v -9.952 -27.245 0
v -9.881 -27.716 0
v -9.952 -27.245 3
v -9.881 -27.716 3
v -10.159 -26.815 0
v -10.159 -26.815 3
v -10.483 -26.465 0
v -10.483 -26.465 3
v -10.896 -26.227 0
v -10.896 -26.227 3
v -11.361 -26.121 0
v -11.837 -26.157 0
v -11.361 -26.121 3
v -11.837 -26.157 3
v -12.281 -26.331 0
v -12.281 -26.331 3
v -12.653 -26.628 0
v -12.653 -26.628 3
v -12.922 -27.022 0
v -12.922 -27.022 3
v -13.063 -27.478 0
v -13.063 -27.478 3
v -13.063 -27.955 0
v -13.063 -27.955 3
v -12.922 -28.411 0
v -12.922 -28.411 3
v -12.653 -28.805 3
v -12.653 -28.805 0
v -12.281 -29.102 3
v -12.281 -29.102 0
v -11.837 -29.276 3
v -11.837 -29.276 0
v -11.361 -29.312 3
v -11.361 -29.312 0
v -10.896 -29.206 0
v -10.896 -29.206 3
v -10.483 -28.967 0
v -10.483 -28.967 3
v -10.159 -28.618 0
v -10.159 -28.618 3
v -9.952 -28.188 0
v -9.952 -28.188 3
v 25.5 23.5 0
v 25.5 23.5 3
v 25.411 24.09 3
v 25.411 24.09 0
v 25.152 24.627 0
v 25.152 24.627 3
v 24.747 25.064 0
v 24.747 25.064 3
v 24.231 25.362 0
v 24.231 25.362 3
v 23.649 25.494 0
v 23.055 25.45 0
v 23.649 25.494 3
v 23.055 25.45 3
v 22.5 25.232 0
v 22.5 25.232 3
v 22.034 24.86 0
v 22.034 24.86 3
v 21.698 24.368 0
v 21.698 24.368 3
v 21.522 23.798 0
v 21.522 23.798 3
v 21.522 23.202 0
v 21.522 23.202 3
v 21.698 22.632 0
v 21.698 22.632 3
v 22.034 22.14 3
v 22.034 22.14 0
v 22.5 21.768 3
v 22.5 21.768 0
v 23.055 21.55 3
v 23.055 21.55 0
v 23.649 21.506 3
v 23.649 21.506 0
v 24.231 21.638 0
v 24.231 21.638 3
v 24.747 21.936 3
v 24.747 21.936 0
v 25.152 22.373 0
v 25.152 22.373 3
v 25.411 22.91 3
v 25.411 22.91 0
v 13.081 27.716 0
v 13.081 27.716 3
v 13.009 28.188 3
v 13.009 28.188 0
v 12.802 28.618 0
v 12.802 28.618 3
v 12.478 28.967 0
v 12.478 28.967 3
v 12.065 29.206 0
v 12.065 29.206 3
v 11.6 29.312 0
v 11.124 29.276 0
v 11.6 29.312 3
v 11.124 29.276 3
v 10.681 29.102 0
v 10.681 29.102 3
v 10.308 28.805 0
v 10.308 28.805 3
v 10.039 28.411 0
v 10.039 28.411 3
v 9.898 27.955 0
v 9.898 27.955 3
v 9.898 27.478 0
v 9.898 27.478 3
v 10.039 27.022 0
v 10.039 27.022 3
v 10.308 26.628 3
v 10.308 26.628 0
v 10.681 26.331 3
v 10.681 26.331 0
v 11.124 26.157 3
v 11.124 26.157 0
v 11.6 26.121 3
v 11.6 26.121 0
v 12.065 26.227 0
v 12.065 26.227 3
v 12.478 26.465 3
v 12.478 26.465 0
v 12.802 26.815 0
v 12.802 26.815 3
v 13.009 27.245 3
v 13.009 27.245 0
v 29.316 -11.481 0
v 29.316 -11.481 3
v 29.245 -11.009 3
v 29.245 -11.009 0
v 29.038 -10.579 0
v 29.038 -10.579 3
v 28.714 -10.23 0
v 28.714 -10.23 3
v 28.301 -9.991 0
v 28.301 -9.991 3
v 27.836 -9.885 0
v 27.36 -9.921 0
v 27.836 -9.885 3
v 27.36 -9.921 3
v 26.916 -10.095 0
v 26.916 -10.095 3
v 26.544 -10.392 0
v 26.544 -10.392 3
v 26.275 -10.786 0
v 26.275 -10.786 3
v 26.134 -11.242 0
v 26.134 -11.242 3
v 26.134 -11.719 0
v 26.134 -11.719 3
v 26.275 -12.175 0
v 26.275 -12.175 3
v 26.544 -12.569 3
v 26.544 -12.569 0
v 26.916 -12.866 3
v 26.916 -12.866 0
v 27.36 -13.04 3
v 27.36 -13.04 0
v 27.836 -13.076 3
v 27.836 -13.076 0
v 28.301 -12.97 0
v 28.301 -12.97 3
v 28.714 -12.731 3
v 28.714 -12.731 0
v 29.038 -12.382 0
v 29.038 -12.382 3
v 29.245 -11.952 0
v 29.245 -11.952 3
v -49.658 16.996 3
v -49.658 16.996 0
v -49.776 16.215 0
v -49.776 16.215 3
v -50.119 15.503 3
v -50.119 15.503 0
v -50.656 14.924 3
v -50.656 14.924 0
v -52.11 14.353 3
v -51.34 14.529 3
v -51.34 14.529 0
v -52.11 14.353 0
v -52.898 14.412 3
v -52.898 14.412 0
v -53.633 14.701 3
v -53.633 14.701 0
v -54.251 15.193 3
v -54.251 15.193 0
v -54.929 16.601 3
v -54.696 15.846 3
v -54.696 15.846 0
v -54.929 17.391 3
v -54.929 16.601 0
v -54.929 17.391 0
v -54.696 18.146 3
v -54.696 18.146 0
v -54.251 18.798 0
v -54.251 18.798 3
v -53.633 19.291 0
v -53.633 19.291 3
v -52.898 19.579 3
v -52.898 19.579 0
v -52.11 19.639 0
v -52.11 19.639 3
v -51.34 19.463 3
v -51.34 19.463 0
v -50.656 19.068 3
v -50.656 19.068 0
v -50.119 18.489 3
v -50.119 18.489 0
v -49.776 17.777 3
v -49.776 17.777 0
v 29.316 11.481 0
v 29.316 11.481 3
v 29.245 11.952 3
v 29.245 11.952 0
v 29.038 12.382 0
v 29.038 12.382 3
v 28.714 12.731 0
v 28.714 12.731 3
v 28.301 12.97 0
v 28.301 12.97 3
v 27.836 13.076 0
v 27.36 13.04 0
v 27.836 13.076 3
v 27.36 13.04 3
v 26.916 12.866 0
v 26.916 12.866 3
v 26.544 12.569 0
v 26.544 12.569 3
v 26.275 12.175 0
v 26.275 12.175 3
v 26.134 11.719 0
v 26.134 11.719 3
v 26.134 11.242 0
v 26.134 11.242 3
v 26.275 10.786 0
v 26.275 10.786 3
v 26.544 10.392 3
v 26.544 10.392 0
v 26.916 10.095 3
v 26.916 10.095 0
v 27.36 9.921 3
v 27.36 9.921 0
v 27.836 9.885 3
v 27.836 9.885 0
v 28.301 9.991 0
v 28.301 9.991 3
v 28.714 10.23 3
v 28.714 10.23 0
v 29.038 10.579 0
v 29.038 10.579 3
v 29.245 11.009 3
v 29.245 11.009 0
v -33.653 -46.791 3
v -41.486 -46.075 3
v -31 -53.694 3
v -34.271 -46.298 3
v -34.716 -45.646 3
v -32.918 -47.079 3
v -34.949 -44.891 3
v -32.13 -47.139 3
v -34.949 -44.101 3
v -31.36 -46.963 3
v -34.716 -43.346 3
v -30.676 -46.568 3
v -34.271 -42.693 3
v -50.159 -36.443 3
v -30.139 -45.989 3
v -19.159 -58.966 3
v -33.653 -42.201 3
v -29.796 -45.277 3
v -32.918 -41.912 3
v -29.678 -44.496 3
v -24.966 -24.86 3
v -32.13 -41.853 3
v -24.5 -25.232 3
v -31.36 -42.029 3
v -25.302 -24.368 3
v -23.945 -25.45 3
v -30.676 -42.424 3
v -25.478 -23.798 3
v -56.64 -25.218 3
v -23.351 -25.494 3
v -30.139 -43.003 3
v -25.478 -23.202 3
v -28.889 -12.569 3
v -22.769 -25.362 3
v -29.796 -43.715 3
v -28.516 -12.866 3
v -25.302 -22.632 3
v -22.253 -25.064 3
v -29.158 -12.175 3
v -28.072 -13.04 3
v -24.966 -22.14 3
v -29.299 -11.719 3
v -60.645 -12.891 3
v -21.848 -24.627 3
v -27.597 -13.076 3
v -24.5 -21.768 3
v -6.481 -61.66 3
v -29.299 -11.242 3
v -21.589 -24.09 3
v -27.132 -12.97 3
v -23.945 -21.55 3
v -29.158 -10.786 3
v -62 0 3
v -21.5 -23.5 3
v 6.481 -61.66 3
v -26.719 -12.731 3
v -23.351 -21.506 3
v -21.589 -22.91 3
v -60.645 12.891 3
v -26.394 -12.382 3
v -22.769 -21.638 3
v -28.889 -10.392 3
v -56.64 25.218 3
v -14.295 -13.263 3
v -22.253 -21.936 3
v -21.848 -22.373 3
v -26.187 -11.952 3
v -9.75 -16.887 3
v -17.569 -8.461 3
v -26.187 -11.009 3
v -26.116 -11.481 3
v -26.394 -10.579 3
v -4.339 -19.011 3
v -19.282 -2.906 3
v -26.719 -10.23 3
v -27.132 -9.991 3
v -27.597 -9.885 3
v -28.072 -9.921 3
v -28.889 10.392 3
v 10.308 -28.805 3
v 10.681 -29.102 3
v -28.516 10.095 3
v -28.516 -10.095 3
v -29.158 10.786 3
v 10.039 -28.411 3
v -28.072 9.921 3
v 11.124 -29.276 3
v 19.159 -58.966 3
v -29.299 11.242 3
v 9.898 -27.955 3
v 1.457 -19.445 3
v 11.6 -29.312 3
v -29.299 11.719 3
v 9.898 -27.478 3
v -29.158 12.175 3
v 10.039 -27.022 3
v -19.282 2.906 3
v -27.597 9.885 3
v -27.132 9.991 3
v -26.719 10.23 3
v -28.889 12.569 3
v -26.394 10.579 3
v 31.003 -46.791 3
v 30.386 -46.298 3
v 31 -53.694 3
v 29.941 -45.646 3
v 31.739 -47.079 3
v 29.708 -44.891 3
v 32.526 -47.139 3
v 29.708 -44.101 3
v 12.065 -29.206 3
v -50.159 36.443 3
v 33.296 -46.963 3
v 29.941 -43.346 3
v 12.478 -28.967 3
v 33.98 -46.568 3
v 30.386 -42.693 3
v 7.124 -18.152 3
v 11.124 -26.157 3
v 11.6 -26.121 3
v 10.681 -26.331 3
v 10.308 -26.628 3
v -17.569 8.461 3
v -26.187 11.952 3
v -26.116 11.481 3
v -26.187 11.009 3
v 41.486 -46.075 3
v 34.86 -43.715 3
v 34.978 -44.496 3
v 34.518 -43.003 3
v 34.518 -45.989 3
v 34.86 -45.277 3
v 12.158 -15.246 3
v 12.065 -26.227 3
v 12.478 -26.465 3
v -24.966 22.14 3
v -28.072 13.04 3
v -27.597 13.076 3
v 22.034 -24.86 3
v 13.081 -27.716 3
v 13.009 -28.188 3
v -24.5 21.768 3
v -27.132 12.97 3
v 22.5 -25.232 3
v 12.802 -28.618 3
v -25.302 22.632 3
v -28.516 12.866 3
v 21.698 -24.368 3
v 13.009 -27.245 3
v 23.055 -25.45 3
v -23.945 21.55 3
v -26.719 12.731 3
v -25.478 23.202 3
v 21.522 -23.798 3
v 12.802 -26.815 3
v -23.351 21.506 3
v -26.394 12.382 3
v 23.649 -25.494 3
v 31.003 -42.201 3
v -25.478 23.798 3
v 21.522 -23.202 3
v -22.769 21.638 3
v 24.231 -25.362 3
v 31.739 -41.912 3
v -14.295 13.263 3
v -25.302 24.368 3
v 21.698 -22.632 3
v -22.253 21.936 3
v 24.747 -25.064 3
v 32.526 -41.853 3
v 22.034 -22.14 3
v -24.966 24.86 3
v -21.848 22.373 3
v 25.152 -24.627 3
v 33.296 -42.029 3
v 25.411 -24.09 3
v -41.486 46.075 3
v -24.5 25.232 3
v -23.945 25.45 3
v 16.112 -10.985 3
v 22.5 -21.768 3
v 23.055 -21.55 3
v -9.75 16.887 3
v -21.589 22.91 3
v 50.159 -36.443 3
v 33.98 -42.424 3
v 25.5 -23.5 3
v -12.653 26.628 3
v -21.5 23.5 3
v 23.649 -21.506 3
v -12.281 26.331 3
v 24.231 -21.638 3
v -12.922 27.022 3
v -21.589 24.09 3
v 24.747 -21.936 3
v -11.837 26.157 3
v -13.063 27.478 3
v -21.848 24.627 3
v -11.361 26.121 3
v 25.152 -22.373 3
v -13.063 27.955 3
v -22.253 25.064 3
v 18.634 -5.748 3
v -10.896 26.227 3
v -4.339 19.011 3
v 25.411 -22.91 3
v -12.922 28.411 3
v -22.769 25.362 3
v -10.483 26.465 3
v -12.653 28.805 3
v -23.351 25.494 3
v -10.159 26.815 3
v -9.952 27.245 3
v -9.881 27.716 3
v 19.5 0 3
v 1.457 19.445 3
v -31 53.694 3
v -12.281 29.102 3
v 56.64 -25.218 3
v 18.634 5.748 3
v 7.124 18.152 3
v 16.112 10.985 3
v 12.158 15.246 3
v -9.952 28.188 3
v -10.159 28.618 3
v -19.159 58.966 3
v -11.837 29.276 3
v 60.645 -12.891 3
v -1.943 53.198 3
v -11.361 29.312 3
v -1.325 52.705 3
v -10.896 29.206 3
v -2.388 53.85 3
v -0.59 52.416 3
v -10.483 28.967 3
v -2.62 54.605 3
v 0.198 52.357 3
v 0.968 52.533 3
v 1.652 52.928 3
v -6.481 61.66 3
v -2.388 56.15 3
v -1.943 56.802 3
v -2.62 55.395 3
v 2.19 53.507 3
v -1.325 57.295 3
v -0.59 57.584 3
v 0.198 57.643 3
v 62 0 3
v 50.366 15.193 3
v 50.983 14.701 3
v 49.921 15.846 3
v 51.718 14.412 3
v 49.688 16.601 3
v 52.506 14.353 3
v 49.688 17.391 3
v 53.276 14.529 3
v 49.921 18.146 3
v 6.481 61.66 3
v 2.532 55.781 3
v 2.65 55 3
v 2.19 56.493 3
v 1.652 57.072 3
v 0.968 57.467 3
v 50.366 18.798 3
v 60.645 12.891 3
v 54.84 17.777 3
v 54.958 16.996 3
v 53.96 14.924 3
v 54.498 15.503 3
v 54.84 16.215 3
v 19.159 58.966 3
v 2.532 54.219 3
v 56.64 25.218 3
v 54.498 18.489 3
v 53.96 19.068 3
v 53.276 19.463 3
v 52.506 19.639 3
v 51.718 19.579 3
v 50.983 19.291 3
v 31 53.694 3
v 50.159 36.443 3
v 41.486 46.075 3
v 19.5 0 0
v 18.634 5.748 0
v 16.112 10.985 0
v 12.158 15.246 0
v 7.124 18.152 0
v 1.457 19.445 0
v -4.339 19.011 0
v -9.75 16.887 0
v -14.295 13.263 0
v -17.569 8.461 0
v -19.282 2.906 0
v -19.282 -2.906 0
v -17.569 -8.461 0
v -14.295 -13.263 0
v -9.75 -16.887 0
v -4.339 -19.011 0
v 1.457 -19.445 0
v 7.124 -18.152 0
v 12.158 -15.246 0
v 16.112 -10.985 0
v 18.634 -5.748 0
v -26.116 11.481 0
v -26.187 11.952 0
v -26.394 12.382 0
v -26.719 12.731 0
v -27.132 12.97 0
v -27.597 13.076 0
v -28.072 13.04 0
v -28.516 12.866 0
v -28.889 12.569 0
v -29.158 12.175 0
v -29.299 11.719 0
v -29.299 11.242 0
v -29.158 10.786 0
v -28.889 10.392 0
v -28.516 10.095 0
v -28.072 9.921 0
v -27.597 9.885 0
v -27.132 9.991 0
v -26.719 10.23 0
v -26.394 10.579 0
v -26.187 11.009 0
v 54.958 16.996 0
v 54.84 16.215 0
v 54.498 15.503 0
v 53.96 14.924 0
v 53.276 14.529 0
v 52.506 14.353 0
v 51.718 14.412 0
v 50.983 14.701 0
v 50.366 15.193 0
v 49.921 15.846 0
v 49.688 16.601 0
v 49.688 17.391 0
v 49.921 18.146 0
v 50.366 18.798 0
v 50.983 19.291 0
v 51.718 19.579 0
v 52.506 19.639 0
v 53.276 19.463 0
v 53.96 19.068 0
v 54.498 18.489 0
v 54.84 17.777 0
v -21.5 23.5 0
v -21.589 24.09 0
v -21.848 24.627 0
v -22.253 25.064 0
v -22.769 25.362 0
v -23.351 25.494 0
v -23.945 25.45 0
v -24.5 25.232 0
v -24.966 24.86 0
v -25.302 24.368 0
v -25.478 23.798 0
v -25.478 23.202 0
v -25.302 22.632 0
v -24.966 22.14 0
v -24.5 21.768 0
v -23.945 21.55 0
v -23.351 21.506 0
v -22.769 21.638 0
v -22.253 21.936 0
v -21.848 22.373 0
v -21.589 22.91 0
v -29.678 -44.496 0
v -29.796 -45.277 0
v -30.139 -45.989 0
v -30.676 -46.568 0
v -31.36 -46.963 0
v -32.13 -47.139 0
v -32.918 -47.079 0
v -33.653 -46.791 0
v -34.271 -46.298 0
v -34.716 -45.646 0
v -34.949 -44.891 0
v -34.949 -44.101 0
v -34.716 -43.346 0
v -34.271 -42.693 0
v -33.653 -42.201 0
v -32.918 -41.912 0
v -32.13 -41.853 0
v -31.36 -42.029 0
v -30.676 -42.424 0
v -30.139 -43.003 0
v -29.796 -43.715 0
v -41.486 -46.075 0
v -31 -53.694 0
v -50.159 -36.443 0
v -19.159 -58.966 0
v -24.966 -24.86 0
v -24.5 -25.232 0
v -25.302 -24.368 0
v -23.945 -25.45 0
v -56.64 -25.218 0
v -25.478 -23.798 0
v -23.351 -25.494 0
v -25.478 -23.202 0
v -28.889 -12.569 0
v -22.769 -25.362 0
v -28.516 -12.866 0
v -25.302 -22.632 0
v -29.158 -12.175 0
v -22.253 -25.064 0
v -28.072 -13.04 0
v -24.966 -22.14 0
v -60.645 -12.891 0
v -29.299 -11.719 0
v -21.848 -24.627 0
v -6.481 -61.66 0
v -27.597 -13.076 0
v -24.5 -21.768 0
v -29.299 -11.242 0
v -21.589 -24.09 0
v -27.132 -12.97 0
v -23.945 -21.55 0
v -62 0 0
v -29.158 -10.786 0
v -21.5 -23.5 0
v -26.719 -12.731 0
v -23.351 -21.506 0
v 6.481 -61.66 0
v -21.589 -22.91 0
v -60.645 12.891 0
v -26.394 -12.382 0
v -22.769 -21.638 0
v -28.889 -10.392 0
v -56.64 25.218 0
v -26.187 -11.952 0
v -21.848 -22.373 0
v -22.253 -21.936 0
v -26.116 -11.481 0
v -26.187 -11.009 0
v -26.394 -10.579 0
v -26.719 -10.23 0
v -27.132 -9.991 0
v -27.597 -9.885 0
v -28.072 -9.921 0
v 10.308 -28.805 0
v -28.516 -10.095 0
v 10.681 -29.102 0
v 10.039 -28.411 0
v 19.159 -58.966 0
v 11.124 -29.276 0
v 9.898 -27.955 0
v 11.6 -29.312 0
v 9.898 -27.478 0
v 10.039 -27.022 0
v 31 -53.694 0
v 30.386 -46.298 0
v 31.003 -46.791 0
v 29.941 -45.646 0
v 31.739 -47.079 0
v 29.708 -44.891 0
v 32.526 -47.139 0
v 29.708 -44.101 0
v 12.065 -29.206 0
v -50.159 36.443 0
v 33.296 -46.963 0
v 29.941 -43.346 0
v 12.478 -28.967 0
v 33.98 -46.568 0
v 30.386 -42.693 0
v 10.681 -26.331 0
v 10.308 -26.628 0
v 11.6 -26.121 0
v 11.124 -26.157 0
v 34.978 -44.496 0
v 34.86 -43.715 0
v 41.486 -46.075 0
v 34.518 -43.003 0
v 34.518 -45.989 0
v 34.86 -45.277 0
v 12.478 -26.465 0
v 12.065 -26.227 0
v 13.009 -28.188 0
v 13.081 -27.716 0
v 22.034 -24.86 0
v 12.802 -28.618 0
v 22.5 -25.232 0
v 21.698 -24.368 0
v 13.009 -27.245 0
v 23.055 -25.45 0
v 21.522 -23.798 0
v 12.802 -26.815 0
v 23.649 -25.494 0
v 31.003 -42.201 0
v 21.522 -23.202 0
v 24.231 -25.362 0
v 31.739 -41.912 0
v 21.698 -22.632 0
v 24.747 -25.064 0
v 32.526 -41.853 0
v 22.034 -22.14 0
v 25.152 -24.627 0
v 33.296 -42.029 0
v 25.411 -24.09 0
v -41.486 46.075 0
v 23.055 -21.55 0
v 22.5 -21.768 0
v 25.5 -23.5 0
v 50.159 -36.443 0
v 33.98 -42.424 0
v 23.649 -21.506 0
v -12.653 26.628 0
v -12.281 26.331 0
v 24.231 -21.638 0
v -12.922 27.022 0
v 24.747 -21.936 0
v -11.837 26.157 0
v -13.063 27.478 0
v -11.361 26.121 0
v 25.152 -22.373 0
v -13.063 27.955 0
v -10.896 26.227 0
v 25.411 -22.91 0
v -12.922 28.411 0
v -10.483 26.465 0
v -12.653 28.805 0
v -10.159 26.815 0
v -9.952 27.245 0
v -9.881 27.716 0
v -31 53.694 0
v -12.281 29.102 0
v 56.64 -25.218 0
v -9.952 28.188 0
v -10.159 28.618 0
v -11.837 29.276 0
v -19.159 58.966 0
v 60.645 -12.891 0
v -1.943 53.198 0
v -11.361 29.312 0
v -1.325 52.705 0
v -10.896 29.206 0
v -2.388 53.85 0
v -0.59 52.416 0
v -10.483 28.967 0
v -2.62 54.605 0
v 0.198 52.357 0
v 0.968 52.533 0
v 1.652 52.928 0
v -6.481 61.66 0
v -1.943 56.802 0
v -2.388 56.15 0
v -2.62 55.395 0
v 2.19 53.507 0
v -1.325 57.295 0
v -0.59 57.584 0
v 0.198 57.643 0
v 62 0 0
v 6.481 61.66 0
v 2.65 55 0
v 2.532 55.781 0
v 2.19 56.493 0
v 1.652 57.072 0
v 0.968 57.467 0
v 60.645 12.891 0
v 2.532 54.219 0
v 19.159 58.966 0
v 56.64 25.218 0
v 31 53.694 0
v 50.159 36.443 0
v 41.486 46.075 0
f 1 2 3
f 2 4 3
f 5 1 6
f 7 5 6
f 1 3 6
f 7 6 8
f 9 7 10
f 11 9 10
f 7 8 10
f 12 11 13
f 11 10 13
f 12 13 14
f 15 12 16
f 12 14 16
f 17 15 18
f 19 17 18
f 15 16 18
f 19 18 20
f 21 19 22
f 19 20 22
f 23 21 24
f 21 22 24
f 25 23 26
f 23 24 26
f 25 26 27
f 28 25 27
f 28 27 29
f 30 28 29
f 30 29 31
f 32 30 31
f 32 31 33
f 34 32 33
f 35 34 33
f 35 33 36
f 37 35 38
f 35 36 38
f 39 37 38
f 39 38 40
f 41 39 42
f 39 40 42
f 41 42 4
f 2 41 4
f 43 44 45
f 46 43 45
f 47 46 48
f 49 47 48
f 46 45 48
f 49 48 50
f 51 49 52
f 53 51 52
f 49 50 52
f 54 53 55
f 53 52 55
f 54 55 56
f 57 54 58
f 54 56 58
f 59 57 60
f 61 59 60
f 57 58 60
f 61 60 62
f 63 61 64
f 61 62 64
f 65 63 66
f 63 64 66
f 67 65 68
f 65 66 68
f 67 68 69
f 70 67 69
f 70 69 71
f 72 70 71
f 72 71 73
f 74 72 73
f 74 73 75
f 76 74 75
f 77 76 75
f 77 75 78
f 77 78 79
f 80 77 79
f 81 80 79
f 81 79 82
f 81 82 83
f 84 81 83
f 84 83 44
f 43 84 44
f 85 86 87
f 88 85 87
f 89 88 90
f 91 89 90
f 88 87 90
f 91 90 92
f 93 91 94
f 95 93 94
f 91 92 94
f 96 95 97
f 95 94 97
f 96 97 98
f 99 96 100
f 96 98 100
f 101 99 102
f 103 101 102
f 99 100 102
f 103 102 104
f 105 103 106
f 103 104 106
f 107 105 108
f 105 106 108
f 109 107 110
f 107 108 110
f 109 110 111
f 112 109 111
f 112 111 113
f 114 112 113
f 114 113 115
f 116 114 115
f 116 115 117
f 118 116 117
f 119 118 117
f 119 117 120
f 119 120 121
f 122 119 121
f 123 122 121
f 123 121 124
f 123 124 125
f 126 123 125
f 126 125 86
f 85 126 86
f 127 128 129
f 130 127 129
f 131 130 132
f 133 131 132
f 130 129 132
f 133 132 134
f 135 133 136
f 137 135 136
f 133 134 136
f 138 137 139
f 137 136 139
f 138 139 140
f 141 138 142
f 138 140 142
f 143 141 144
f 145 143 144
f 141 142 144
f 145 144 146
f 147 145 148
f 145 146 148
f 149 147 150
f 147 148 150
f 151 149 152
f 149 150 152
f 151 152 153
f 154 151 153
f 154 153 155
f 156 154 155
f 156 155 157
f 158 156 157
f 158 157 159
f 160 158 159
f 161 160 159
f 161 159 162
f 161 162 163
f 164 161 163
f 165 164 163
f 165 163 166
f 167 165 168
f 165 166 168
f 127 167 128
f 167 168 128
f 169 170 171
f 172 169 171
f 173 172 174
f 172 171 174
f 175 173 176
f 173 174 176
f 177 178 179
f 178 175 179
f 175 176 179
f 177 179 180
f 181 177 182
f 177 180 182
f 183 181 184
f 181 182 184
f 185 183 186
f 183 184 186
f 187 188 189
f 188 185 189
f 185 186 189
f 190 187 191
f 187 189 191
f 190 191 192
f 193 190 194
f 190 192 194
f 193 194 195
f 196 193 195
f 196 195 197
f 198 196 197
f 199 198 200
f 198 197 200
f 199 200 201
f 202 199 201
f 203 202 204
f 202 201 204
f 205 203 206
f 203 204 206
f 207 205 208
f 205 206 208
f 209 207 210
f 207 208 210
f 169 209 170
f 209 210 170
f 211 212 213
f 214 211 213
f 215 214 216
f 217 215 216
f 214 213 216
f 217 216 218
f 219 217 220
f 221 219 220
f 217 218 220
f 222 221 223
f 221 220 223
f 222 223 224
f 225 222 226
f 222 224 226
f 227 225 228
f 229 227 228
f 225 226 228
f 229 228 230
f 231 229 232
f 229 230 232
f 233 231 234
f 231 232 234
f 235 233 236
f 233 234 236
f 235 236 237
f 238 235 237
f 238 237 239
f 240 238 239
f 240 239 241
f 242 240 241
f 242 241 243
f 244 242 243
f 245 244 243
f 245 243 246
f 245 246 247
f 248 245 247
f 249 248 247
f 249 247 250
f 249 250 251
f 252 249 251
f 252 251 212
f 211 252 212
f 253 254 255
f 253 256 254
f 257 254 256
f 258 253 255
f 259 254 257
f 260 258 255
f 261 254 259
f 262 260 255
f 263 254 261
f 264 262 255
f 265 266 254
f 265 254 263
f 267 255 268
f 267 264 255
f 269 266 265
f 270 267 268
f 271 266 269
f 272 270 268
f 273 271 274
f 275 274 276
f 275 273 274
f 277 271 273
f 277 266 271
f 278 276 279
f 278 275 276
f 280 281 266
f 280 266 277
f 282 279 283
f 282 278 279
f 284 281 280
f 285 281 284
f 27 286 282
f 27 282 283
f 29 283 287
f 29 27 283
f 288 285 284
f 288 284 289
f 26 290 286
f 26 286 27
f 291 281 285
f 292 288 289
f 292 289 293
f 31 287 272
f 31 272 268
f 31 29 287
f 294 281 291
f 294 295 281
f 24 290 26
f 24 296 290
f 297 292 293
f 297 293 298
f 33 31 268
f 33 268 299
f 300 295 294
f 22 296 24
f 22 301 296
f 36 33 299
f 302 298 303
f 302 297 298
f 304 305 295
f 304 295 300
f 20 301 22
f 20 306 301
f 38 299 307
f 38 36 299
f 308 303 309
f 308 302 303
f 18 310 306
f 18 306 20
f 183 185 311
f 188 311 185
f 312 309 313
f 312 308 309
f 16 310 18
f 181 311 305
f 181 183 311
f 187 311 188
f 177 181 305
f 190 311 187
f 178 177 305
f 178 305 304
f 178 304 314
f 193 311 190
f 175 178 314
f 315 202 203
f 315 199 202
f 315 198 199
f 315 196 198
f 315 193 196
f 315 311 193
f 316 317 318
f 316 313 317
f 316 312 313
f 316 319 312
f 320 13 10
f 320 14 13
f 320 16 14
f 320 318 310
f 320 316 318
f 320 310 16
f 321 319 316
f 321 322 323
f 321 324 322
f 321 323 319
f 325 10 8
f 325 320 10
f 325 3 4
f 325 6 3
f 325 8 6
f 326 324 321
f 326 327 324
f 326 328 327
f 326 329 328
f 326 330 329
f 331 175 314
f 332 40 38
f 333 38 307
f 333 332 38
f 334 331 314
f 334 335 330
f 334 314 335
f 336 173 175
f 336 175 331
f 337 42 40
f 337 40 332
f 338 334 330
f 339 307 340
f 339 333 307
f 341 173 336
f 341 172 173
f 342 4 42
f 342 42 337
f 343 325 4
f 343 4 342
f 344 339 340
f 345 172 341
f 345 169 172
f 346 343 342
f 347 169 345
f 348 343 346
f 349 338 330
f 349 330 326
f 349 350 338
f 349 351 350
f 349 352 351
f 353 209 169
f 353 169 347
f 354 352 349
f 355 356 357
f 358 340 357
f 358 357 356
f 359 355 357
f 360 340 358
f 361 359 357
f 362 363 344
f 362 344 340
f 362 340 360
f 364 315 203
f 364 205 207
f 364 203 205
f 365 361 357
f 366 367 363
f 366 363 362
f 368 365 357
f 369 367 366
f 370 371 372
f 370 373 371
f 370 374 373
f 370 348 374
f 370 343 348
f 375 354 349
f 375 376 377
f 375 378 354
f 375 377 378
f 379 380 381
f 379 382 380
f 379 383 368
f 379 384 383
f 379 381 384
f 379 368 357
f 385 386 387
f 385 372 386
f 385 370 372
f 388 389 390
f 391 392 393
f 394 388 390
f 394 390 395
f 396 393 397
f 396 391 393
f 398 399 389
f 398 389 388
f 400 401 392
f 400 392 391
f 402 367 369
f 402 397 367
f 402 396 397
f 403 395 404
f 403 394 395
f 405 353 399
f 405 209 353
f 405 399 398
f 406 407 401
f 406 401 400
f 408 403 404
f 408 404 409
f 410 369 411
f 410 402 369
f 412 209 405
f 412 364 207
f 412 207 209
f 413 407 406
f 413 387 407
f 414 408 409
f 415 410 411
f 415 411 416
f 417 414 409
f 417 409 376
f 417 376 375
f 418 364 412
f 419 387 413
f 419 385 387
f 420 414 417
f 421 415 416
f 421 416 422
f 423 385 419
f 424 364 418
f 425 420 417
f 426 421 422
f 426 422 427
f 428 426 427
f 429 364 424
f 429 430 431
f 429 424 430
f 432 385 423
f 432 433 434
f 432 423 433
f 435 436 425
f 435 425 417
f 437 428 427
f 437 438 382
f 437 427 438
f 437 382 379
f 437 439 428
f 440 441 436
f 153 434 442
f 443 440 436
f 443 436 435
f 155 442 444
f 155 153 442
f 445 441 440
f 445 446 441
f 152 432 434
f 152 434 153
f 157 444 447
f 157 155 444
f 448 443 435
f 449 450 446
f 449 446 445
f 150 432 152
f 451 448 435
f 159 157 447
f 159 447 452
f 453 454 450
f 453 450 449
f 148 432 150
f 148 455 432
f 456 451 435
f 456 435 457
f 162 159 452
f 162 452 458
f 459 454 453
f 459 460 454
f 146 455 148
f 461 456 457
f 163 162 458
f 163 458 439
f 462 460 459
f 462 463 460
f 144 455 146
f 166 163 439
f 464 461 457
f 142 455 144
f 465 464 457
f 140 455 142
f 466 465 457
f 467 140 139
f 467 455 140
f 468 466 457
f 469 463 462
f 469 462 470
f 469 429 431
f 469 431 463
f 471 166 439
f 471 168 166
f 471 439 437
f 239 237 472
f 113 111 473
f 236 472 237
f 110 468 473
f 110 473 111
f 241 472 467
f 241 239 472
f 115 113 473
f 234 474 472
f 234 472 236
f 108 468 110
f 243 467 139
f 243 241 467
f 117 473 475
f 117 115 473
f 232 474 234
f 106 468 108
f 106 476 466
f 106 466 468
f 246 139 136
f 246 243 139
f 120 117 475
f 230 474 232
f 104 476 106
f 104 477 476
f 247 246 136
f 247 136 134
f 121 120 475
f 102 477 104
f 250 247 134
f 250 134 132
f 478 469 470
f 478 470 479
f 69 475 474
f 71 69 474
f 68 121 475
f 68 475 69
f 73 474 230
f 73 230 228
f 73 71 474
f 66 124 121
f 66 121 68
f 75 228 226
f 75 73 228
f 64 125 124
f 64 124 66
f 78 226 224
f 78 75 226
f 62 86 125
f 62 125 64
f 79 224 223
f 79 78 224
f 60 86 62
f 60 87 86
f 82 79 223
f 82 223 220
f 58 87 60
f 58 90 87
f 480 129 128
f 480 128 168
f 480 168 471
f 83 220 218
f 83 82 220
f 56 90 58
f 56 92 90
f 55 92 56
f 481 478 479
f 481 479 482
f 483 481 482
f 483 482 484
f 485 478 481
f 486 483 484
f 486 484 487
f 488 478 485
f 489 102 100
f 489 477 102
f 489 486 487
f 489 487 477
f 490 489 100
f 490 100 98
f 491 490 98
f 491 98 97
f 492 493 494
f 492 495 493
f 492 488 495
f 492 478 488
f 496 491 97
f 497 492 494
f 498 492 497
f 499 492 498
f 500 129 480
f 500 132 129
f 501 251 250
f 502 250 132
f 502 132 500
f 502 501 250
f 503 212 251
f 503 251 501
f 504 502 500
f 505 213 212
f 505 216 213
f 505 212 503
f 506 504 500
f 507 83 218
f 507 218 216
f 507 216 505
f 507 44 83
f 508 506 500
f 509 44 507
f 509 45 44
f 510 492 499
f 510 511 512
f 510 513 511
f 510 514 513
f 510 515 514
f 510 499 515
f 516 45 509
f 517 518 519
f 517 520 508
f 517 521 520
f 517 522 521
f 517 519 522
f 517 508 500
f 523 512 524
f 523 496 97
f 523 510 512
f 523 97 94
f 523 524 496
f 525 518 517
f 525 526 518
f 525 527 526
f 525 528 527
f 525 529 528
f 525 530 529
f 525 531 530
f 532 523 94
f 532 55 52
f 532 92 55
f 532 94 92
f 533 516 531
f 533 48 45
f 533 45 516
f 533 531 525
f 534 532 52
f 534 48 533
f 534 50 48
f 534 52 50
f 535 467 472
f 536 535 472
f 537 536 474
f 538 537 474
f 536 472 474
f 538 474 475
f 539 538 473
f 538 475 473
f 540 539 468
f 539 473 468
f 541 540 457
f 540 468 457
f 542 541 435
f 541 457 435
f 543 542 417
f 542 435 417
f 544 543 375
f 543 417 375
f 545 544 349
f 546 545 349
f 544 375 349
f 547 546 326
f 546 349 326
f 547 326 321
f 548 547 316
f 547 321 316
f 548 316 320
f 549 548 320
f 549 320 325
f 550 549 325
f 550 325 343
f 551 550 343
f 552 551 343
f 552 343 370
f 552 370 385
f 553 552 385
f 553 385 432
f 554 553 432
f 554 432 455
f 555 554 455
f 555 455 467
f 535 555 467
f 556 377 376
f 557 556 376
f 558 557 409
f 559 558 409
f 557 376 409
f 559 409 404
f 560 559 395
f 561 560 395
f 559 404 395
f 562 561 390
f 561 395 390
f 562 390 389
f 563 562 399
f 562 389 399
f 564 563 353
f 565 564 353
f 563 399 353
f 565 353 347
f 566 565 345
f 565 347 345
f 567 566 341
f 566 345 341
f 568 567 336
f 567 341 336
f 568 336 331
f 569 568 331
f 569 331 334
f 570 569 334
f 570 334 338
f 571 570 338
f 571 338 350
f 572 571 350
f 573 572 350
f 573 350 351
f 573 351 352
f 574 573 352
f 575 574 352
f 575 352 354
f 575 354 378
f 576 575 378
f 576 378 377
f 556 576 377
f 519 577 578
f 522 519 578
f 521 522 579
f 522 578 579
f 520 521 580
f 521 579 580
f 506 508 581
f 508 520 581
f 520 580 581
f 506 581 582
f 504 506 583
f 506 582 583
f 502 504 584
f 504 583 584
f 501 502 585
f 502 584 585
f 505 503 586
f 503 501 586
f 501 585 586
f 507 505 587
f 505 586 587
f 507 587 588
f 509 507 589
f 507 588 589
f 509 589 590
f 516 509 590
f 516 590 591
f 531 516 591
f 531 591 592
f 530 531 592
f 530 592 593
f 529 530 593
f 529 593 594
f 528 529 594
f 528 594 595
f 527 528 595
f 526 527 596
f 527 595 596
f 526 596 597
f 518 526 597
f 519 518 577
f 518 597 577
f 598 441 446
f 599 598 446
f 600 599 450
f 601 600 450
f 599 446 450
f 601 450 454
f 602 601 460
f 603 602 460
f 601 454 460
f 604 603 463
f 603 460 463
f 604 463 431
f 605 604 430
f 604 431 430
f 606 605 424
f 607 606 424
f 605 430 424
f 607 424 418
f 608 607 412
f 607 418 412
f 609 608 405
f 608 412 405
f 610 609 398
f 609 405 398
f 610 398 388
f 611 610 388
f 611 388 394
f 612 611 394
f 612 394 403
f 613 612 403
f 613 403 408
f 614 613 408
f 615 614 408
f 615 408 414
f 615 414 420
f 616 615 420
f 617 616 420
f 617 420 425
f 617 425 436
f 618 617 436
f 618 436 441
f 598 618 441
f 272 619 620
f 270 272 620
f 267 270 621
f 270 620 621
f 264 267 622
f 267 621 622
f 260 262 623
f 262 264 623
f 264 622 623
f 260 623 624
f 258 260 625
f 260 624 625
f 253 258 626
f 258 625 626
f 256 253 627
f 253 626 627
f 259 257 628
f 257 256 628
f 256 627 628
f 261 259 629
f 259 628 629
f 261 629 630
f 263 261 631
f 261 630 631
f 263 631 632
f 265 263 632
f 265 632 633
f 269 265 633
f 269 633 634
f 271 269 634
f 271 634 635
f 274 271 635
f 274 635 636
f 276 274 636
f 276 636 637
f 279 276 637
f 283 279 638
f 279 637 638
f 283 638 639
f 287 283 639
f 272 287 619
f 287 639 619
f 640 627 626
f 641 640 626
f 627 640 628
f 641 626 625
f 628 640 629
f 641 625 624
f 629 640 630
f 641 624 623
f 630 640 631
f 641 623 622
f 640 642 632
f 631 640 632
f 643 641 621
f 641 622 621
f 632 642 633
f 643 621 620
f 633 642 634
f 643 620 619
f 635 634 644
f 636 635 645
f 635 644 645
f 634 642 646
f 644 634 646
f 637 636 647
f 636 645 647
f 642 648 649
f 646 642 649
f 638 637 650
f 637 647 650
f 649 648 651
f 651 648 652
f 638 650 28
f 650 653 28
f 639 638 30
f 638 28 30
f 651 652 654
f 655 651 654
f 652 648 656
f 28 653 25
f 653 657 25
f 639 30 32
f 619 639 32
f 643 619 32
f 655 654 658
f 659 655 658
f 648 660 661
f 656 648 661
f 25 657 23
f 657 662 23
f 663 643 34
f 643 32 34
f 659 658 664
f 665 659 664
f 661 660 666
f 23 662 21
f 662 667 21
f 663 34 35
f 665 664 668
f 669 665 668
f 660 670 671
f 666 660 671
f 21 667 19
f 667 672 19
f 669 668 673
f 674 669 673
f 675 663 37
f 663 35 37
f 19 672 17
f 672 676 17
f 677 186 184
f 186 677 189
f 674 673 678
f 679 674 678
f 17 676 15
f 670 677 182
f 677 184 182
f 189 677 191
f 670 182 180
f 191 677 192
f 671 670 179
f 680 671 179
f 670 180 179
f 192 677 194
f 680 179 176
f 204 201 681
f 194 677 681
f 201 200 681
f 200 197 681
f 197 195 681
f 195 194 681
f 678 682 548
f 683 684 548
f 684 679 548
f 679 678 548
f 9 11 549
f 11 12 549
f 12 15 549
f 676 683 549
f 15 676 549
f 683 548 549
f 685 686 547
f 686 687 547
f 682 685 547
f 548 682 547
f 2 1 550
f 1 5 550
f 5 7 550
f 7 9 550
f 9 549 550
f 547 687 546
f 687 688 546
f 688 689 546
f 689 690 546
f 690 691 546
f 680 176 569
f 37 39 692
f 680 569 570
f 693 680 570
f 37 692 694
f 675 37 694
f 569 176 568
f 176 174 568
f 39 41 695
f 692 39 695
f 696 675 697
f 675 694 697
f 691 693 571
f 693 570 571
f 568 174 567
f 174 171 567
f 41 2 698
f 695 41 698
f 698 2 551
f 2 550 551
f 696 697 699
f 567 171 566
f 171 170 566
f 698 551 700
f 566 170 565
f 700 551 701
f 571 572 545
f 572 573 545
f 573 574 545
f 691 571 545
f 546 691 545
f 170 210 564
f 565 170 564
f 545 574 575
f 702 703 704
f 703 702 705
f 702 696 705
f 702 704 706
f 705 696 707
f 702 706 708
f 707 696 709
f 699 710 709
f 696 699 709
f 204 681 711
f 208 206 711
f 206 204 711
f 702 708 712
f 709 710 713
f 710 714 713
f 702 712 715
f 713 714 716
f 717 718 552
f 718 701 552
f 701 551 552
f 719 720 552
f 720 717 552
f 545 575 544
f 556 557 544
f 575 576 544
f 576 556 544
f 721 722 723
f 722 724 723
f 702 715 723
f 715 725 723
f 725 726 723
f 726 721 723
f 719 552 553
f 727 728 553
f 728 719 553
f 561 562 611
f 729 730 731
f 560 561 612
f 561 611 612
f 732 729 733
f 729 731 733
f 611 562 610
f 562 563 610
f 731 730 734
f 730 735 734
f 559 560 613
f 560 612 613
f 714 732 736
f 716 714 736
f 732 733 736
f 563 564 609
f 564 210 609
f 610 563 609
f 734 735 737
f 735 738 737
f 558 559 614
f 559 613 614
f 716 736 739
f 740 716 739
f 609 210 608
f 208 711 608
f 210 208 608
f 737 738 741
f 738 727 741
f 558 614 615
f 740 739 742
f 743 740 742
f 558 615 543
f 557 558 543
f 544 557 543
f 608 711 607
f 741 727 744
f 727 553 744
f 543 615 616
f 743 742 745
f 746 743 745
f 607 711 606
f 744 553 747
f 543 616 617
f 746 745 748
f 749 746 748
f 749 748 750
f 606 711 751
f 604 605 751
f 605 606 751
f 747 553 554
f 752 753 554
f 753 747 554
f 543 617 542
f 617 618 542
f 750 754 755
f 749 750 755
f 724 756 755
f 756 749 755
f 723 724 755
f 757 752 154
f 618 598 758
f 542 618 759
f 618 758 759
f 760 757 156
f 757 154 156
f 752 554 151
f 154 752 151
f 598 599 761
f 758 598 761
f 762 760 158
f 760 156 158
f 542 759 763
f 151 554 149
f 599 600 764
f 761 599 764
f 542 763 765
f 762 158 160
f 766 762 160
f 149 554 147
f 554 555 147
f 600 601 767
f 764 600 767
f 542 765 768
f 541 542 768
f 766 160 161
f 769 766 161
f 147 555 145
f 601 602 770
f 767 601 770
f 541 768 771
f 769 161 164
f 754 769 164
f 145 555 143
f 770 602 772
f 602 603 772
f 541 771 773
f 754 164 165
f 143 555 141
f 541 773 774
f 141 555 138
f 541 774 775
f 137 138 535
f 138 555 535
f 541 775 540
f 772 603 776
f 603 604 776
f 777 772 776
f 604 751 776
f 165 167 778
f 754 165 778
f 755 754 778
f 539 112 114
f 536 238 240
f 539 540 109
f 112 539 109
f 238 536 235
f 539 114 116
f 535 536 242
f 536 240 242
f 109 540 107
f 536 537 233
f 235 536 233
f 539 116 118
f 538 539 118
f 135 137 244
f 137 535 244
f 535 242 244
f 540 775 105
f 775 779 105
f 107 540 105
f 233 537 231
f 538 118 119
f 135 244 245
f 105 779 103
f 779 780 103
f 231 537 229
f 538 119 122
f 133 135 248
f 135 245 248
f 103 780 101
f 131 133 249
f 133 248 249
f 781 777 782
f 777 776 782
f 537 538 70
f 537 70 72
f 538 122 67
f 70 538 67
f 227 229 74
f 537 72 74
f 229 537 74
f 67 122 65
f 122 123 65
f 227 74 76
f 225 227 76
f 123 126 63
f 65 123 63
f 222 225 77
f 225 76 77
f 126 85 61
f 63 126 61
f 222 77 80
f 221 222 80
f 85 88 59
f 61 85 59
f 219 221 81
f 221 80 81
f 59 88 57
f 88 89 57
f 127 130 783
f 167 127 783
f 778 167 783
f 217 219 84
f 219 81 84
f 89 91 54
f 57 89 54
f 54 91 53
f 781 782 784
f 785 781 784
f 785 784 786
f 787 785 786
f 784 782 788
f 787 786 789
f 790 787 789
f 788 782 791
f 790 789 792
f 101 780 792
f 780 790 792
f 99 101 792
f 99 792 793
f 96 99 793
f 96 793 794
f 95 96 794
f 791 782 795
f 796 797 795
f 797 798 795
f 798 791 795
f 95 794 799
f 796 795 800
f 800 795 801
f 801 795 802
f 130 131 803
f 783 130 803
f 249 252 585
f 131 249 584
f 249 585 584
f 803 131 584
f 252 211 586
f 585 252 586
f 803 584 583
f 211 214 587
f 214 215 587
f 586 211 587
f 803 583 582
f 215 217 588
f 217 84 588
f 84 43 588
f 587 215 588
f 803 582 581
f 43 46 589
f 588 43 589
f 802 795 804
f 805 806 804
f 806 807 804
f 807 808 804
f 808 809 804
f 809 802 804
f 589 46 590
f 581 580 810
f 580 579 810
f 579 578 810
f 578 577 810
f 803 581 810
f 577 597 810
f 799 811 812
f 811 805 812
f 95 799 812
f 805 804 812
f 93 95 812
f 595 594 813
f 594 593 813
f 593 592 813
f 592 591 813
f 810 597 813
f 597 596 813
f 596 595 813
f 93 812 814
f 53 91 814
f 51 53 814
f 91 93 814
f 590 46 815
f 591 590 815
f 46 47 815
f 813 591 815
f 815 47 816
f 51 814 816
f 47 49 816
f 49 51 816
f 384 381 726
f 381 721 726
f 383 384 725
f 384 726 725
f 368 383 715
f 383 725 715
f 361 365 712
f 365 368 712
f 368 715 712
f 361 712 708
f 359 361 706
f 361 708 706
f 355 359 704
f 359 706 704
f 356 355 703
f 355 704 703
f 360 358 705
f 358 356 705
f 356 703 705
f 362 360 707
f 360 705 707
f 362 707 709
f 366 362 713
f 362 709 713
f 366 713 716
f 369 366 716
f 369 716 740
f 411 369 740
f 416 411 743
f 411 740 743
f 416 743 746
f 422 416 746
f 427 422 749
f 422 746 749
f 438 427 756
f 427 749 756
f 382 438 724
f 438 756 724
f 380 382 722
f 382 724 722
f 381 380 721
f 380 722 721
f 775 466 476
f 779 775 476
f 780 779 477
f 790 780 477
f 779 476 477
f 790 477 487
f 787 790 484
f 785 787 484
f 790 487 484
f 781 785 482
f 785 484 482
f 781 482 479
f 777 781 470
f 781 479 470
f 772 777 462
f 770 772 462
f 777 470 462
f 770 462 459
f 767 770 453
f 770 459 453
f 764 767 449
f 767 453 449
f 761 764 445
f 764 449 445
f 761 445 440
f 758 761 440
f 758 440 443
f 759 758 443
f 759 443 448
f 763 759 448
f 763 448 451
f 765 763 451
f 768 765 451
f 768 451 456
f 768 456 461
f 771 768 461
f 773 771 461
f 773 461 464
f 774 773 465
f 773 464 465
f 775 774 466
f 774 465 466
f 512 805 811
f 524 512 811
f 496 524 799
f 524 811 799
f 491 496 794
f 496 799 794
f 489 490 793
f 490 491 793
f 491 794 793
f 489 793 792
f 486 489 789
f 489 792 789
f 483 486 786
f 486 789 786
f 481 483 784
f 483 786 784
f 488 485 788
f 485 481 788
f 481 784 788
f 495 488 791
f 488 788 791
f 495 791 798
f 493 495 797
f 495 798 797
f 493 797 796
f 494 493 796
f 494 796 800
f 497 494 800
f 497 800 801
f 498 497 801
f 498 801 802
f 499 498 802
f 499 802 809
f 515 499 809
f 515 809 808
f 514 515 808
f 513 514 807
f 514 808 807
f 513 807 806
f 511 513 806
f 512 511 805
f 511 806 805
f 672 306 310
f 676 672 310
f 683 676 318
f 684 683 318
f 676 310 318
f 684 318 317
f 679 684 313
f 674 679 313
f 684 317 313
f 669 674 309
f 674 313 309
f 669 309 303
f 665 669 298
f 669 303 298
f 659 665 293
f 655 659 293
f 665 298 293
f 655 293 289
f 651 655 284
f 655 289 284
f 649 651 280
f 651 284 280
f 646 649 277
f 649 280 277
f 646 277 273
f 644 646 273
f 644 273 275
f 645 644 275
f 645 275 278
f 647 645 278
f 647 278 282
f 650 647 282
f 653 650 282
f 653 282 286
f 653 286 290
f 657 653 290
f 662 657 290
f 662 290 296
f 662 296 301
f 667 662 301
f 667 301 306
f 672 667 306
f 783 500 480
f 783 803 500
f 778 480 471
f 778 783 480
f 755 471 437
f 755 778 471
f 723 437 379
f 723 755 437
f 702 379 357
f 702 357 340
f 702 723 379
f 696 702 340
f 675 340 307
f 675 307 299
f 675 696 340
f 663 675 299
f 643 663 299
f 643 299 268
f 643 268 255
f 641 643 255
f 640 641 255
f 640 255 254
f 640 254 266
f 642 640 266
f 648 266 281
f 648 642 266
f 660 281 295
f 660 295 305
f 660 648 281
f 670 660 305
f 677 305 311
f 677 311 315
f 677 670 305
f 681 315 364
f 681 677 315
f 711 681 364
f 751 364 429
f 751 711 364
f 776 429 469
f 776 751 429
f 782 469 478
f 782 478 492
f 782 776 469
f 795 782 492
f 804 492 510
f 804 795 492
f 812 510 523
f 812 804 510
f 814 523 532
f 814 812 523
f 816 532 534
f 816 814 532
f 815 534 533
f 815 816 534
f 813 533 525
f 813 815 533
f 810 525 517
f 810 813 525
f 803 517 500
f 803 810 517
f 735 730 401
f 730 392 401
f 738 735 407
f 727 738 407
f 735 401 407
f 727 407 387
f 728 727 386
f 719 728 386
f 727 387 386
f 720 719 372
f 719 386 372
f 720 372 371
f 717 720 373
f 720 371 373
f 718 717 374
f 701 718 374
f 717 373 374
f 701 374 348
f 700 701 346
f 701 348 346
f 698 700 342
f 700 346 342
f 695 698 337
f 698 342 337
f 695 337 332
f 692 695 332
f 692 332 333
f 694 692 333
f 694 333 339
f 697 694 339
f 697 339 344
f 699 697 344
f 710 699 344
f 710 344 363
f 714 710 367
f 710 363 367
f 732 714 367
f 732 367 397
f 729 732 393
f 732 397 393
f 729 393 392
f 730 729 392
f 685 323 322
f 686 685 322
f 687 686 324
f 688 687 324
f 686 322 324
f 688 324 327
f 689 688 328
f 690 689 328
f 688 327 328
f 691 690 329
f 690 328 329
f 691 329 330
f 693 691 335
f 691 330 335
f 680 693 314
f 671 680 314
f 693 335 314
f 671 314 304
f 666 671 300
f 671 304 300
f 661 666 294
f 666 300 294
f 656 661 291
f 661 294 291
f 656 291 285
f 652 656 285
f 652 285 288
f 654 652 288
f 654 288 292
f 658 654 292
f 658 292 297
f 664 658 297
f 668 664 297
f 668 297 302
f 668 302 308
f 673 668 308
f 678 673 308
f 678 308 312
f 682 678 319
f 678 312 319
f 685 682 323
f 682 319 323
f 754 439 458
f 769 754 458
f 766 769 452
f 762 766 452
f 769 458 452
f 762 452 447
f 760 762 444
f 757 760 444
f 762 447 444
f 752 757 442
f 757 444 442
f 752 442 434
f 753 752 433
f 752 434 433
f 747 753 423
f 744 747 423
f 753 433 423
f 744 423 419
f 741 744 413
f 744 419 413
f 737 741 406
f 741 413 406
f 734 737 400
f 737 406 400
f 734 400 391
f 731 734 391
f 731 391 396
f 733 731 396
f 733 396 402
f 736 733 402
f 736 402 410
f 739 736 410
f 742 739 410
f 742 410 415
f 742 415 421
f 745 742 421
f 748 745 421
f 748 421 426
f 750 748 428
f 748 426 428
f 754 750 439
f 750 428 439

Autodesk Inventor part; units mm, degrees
ref_plane "YZ Plane" through (0, 0, 0) normal (1, 0, 0) x (0, 1, 0)
ref_plane "XZ Plane" through (0, 0, 0) normal (0, 1, 0) x (-1, 0, 0)
ref_plane "XY Plane" through (0, 0, 0) normal (0, 0, 1) x (1, 0, 0)
sketch "Sketch1" plane through (0, 0, 0) normal (0, 0, 1) x (1, 0, 0)
  circle A0 centre (0, 55) radius 2.65
  arc A1 (62, 0) -> (-62, 0) centre (0, 0) ccw
  line L0 (-62, 0) -> (-62, -80)
  line L1 (-62, -80) -> (62, -80)
  line L2 (62, -80) -> (62, 0)
  circle A2 centre (0, 0) radius 47.5 construction
  circle A3 centre (0, 0) radius 55 construction
  line L3 (0, 55) -> (0, 0) construction
  circle A4 centre (-52.308108, 16.995935) radius 2.65
  circle A5 centre (-32.328189, -44.495935) radius 2.65
  circle A6 centre (32.328189, -44.495935) radius 2.65
  circle A7 centre (52.308108, 16.995935) radius 2.65
  dimension "d23" = 110
  dimension "d24" = 95
  dimension "d25" = 62
  dimension "d26" = 80
  dimension "d27" = 5.3
  dimension "d30" = 360
extrude "Extrusion1" add sketch "Sketch1" along normal blind 3
sketch "Sketch2" plane through (0, 0, 3) normal (0, 0, 1) x (1, 0, 0)
  circle A0 centre (0, 0) radius 19.5
  line L0 (-23.5, -23.5) -> (23.5, -23.5) construction
  line L1 (23.5, -23.5) -> (23.5, 23.5) construction
  line L2 (23.5, 23.5) -> (-23.5, 23.5) construction
  line L3 (-23.5, 23.5) -> (-23.5, -23.5) construction
  line L4 (-23.5, -23.5) -> (23.5, 23.5) construction
  line L5 (23.5, -23.5) -> (-23.5, 23.5) construction
  circle A1 centre (-23.5, 23.5) radius 2
  circle A2 centre (23.5, 23.5) radius 2
  circle A3 centre (23.5, -23.5) radius 2
  circle A4 centre (-23.5, -23.5) radius 2
  dimension "d2" = 39
  dimension "d3" = 47
  dimension "d4" = 4
extrude "Extrusion2" cut sketch "Sketch2" against normal through all
sketch "Sketch3" plane through (0, 0, 3) normal (0, 0, 1) x (1, 0, 0)
  arc A0 (62, 0) -> (-62, 0) centre (0, 0) ccw
  circle A1 centre (0, 0) radius 62
  circle A2 centre (0, 0) radius 147.62847
  point P0 (62, 0)
sketch "Sketch3 outline for Extrusion3" plane through (0, 0, 3) normal (0, 0, 1) x (1, 0, 0)
  circle A0 centre (0, 0) radius 147.62847
  arc A1 (62, 0) -> (-62, 0) centre (0, 0) cw
  arc A2 (-62, 0) -> (62, 0) centre (0, 0) cw
extrude "Extrusion3" cut sketch "Sketch3 outline for Extrusion3" against normal through all
sketch "Sketch4" plane through (0, 0, 3) normal (0, 0, 1) x (1, 0, 0)
  circle A0 centre (0, 0) radius 30 construction
  circle A1 centre (-27.716386, 11.480503) radius 1.6
  line L0 (-27.716386, 11.480503) -> (0, 0) construction
  line L1 (-27.716386, -11.480503) -> (0, 0) construction
  circle A2 centre (-27.716386, -11.480503) radius 1.6
  line L2 (-11.480503, -27.716386) -> (0, 0) construction
  circle A3 centre (-11.480503, -27.716386) radius 1.6
  line L3 (11.480503, -27.716386) -> (0, 0) construction
  circle A4 centre (11.480503, -27.716386) radius 1.6
  line L4 (27.716386, -11.480503) -> (0, 0) construction
  circle A5 centre (27.716386, -11.480503) radius 1.6
  line L5 (27.716386, 11.480503) -> (0, 0) construction
  circle A6 centre (27.716386, 11.480503) radius 1.6
  line L6 (11.480503, 27.716386) -> (0, 0) construction
  circle A7 centre (11.480503, 27.716386) radius 1.6
  line L7 (-11.480503, 27.716386) -> (0, 0) construction
  circle A8 centre (-11.480503, 27.716386) radius 1.6
  line L8 (0, 0) -> (-27.716386, 0) construction
  line L9 (-27.716386, 0) -> (-27.716386, 11.480503) construction
  line L10 (-27.716386, 0) -> (-27.716386, -11.480503) construction
  dimension "d9" = 60
  dimension "d10" = 3.2
  dimension "d13" = 360
extrude "Extrusion4" cut sketch "Sketch4" against normal through all
properties part number "J0_motorbracket"
